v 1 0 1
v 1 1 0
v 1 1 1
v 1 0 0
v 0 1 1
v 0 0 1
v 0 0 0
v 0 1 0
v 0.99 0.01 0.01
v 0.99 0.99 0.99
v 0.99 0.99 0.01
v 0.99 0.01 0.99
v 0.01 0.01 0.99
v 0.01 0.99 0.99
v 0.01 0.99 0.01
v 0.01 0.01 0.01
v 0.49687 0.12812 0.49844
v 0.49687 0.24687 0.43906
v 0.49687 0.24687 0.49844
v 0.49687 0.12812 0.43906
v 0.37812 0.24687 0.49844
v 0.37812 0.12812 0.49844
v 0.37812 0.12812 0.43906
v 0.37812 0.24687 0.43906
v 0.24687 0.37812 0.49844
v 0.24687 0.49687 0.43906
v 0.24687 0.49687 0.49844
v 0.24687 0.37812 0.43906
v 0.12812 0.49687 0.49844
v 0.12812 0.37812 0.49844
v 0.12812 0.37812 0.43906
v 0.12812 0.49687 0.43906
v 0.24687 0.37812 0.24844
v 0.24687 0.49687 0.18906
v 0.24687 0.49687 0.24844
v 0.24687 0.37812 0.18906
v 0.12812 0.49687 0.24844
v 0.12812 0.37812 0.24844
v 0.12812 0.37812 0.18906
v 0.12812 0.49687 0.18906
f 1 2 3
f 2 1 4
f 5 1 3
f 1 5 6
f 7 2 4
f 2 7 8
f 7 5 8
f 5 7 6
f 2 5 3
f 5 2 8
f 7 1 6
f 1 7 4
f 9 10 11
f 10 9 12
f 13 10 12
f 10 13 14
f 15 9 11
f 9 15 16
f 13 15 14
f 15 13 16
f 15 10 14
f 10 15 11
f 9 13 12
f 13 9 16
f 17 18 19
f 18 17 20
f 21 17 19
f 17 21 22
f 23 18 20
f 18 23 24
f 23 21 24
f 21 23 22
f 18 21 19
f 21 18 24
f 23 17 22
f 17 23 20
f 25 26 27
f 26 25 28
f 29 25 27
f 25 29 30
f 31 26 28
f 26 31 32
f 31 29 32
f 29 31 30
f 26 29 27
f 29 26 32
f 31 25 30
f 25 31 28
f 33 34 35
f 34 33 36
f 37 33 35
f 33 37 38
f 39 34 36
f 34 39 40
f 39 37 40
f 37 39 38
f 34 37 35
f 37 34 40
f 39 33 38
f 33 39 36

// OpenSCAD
translate([0.4375, 0.1875, 0.46875]) color([0.9661595458779266, 0.8212204941997756, 0.9717572370221306]) cube([0.11875, 0.11875, 0.059375], center=true);
translate([0.1875, 0.4375, 0.46875]) color([0.7094339661906762, 0.3687560915635114, 0.91551222113324]) cube([0.11875, 0.11875, 0.059375], center=true);
translate([0.1875, 0.4375, 0.21875]) color([0.32058638357595914, 0.6286861798780845, 0.3438006598659582]) cube([0.11875, 0.11875, 0.059375], center=true);
color([0.3,0.3,0.3,0.3]) difference() { cube([1,1,1]); translate([0.01,0.01,0.01]) cube([0.98,0.98,0.98]); }
